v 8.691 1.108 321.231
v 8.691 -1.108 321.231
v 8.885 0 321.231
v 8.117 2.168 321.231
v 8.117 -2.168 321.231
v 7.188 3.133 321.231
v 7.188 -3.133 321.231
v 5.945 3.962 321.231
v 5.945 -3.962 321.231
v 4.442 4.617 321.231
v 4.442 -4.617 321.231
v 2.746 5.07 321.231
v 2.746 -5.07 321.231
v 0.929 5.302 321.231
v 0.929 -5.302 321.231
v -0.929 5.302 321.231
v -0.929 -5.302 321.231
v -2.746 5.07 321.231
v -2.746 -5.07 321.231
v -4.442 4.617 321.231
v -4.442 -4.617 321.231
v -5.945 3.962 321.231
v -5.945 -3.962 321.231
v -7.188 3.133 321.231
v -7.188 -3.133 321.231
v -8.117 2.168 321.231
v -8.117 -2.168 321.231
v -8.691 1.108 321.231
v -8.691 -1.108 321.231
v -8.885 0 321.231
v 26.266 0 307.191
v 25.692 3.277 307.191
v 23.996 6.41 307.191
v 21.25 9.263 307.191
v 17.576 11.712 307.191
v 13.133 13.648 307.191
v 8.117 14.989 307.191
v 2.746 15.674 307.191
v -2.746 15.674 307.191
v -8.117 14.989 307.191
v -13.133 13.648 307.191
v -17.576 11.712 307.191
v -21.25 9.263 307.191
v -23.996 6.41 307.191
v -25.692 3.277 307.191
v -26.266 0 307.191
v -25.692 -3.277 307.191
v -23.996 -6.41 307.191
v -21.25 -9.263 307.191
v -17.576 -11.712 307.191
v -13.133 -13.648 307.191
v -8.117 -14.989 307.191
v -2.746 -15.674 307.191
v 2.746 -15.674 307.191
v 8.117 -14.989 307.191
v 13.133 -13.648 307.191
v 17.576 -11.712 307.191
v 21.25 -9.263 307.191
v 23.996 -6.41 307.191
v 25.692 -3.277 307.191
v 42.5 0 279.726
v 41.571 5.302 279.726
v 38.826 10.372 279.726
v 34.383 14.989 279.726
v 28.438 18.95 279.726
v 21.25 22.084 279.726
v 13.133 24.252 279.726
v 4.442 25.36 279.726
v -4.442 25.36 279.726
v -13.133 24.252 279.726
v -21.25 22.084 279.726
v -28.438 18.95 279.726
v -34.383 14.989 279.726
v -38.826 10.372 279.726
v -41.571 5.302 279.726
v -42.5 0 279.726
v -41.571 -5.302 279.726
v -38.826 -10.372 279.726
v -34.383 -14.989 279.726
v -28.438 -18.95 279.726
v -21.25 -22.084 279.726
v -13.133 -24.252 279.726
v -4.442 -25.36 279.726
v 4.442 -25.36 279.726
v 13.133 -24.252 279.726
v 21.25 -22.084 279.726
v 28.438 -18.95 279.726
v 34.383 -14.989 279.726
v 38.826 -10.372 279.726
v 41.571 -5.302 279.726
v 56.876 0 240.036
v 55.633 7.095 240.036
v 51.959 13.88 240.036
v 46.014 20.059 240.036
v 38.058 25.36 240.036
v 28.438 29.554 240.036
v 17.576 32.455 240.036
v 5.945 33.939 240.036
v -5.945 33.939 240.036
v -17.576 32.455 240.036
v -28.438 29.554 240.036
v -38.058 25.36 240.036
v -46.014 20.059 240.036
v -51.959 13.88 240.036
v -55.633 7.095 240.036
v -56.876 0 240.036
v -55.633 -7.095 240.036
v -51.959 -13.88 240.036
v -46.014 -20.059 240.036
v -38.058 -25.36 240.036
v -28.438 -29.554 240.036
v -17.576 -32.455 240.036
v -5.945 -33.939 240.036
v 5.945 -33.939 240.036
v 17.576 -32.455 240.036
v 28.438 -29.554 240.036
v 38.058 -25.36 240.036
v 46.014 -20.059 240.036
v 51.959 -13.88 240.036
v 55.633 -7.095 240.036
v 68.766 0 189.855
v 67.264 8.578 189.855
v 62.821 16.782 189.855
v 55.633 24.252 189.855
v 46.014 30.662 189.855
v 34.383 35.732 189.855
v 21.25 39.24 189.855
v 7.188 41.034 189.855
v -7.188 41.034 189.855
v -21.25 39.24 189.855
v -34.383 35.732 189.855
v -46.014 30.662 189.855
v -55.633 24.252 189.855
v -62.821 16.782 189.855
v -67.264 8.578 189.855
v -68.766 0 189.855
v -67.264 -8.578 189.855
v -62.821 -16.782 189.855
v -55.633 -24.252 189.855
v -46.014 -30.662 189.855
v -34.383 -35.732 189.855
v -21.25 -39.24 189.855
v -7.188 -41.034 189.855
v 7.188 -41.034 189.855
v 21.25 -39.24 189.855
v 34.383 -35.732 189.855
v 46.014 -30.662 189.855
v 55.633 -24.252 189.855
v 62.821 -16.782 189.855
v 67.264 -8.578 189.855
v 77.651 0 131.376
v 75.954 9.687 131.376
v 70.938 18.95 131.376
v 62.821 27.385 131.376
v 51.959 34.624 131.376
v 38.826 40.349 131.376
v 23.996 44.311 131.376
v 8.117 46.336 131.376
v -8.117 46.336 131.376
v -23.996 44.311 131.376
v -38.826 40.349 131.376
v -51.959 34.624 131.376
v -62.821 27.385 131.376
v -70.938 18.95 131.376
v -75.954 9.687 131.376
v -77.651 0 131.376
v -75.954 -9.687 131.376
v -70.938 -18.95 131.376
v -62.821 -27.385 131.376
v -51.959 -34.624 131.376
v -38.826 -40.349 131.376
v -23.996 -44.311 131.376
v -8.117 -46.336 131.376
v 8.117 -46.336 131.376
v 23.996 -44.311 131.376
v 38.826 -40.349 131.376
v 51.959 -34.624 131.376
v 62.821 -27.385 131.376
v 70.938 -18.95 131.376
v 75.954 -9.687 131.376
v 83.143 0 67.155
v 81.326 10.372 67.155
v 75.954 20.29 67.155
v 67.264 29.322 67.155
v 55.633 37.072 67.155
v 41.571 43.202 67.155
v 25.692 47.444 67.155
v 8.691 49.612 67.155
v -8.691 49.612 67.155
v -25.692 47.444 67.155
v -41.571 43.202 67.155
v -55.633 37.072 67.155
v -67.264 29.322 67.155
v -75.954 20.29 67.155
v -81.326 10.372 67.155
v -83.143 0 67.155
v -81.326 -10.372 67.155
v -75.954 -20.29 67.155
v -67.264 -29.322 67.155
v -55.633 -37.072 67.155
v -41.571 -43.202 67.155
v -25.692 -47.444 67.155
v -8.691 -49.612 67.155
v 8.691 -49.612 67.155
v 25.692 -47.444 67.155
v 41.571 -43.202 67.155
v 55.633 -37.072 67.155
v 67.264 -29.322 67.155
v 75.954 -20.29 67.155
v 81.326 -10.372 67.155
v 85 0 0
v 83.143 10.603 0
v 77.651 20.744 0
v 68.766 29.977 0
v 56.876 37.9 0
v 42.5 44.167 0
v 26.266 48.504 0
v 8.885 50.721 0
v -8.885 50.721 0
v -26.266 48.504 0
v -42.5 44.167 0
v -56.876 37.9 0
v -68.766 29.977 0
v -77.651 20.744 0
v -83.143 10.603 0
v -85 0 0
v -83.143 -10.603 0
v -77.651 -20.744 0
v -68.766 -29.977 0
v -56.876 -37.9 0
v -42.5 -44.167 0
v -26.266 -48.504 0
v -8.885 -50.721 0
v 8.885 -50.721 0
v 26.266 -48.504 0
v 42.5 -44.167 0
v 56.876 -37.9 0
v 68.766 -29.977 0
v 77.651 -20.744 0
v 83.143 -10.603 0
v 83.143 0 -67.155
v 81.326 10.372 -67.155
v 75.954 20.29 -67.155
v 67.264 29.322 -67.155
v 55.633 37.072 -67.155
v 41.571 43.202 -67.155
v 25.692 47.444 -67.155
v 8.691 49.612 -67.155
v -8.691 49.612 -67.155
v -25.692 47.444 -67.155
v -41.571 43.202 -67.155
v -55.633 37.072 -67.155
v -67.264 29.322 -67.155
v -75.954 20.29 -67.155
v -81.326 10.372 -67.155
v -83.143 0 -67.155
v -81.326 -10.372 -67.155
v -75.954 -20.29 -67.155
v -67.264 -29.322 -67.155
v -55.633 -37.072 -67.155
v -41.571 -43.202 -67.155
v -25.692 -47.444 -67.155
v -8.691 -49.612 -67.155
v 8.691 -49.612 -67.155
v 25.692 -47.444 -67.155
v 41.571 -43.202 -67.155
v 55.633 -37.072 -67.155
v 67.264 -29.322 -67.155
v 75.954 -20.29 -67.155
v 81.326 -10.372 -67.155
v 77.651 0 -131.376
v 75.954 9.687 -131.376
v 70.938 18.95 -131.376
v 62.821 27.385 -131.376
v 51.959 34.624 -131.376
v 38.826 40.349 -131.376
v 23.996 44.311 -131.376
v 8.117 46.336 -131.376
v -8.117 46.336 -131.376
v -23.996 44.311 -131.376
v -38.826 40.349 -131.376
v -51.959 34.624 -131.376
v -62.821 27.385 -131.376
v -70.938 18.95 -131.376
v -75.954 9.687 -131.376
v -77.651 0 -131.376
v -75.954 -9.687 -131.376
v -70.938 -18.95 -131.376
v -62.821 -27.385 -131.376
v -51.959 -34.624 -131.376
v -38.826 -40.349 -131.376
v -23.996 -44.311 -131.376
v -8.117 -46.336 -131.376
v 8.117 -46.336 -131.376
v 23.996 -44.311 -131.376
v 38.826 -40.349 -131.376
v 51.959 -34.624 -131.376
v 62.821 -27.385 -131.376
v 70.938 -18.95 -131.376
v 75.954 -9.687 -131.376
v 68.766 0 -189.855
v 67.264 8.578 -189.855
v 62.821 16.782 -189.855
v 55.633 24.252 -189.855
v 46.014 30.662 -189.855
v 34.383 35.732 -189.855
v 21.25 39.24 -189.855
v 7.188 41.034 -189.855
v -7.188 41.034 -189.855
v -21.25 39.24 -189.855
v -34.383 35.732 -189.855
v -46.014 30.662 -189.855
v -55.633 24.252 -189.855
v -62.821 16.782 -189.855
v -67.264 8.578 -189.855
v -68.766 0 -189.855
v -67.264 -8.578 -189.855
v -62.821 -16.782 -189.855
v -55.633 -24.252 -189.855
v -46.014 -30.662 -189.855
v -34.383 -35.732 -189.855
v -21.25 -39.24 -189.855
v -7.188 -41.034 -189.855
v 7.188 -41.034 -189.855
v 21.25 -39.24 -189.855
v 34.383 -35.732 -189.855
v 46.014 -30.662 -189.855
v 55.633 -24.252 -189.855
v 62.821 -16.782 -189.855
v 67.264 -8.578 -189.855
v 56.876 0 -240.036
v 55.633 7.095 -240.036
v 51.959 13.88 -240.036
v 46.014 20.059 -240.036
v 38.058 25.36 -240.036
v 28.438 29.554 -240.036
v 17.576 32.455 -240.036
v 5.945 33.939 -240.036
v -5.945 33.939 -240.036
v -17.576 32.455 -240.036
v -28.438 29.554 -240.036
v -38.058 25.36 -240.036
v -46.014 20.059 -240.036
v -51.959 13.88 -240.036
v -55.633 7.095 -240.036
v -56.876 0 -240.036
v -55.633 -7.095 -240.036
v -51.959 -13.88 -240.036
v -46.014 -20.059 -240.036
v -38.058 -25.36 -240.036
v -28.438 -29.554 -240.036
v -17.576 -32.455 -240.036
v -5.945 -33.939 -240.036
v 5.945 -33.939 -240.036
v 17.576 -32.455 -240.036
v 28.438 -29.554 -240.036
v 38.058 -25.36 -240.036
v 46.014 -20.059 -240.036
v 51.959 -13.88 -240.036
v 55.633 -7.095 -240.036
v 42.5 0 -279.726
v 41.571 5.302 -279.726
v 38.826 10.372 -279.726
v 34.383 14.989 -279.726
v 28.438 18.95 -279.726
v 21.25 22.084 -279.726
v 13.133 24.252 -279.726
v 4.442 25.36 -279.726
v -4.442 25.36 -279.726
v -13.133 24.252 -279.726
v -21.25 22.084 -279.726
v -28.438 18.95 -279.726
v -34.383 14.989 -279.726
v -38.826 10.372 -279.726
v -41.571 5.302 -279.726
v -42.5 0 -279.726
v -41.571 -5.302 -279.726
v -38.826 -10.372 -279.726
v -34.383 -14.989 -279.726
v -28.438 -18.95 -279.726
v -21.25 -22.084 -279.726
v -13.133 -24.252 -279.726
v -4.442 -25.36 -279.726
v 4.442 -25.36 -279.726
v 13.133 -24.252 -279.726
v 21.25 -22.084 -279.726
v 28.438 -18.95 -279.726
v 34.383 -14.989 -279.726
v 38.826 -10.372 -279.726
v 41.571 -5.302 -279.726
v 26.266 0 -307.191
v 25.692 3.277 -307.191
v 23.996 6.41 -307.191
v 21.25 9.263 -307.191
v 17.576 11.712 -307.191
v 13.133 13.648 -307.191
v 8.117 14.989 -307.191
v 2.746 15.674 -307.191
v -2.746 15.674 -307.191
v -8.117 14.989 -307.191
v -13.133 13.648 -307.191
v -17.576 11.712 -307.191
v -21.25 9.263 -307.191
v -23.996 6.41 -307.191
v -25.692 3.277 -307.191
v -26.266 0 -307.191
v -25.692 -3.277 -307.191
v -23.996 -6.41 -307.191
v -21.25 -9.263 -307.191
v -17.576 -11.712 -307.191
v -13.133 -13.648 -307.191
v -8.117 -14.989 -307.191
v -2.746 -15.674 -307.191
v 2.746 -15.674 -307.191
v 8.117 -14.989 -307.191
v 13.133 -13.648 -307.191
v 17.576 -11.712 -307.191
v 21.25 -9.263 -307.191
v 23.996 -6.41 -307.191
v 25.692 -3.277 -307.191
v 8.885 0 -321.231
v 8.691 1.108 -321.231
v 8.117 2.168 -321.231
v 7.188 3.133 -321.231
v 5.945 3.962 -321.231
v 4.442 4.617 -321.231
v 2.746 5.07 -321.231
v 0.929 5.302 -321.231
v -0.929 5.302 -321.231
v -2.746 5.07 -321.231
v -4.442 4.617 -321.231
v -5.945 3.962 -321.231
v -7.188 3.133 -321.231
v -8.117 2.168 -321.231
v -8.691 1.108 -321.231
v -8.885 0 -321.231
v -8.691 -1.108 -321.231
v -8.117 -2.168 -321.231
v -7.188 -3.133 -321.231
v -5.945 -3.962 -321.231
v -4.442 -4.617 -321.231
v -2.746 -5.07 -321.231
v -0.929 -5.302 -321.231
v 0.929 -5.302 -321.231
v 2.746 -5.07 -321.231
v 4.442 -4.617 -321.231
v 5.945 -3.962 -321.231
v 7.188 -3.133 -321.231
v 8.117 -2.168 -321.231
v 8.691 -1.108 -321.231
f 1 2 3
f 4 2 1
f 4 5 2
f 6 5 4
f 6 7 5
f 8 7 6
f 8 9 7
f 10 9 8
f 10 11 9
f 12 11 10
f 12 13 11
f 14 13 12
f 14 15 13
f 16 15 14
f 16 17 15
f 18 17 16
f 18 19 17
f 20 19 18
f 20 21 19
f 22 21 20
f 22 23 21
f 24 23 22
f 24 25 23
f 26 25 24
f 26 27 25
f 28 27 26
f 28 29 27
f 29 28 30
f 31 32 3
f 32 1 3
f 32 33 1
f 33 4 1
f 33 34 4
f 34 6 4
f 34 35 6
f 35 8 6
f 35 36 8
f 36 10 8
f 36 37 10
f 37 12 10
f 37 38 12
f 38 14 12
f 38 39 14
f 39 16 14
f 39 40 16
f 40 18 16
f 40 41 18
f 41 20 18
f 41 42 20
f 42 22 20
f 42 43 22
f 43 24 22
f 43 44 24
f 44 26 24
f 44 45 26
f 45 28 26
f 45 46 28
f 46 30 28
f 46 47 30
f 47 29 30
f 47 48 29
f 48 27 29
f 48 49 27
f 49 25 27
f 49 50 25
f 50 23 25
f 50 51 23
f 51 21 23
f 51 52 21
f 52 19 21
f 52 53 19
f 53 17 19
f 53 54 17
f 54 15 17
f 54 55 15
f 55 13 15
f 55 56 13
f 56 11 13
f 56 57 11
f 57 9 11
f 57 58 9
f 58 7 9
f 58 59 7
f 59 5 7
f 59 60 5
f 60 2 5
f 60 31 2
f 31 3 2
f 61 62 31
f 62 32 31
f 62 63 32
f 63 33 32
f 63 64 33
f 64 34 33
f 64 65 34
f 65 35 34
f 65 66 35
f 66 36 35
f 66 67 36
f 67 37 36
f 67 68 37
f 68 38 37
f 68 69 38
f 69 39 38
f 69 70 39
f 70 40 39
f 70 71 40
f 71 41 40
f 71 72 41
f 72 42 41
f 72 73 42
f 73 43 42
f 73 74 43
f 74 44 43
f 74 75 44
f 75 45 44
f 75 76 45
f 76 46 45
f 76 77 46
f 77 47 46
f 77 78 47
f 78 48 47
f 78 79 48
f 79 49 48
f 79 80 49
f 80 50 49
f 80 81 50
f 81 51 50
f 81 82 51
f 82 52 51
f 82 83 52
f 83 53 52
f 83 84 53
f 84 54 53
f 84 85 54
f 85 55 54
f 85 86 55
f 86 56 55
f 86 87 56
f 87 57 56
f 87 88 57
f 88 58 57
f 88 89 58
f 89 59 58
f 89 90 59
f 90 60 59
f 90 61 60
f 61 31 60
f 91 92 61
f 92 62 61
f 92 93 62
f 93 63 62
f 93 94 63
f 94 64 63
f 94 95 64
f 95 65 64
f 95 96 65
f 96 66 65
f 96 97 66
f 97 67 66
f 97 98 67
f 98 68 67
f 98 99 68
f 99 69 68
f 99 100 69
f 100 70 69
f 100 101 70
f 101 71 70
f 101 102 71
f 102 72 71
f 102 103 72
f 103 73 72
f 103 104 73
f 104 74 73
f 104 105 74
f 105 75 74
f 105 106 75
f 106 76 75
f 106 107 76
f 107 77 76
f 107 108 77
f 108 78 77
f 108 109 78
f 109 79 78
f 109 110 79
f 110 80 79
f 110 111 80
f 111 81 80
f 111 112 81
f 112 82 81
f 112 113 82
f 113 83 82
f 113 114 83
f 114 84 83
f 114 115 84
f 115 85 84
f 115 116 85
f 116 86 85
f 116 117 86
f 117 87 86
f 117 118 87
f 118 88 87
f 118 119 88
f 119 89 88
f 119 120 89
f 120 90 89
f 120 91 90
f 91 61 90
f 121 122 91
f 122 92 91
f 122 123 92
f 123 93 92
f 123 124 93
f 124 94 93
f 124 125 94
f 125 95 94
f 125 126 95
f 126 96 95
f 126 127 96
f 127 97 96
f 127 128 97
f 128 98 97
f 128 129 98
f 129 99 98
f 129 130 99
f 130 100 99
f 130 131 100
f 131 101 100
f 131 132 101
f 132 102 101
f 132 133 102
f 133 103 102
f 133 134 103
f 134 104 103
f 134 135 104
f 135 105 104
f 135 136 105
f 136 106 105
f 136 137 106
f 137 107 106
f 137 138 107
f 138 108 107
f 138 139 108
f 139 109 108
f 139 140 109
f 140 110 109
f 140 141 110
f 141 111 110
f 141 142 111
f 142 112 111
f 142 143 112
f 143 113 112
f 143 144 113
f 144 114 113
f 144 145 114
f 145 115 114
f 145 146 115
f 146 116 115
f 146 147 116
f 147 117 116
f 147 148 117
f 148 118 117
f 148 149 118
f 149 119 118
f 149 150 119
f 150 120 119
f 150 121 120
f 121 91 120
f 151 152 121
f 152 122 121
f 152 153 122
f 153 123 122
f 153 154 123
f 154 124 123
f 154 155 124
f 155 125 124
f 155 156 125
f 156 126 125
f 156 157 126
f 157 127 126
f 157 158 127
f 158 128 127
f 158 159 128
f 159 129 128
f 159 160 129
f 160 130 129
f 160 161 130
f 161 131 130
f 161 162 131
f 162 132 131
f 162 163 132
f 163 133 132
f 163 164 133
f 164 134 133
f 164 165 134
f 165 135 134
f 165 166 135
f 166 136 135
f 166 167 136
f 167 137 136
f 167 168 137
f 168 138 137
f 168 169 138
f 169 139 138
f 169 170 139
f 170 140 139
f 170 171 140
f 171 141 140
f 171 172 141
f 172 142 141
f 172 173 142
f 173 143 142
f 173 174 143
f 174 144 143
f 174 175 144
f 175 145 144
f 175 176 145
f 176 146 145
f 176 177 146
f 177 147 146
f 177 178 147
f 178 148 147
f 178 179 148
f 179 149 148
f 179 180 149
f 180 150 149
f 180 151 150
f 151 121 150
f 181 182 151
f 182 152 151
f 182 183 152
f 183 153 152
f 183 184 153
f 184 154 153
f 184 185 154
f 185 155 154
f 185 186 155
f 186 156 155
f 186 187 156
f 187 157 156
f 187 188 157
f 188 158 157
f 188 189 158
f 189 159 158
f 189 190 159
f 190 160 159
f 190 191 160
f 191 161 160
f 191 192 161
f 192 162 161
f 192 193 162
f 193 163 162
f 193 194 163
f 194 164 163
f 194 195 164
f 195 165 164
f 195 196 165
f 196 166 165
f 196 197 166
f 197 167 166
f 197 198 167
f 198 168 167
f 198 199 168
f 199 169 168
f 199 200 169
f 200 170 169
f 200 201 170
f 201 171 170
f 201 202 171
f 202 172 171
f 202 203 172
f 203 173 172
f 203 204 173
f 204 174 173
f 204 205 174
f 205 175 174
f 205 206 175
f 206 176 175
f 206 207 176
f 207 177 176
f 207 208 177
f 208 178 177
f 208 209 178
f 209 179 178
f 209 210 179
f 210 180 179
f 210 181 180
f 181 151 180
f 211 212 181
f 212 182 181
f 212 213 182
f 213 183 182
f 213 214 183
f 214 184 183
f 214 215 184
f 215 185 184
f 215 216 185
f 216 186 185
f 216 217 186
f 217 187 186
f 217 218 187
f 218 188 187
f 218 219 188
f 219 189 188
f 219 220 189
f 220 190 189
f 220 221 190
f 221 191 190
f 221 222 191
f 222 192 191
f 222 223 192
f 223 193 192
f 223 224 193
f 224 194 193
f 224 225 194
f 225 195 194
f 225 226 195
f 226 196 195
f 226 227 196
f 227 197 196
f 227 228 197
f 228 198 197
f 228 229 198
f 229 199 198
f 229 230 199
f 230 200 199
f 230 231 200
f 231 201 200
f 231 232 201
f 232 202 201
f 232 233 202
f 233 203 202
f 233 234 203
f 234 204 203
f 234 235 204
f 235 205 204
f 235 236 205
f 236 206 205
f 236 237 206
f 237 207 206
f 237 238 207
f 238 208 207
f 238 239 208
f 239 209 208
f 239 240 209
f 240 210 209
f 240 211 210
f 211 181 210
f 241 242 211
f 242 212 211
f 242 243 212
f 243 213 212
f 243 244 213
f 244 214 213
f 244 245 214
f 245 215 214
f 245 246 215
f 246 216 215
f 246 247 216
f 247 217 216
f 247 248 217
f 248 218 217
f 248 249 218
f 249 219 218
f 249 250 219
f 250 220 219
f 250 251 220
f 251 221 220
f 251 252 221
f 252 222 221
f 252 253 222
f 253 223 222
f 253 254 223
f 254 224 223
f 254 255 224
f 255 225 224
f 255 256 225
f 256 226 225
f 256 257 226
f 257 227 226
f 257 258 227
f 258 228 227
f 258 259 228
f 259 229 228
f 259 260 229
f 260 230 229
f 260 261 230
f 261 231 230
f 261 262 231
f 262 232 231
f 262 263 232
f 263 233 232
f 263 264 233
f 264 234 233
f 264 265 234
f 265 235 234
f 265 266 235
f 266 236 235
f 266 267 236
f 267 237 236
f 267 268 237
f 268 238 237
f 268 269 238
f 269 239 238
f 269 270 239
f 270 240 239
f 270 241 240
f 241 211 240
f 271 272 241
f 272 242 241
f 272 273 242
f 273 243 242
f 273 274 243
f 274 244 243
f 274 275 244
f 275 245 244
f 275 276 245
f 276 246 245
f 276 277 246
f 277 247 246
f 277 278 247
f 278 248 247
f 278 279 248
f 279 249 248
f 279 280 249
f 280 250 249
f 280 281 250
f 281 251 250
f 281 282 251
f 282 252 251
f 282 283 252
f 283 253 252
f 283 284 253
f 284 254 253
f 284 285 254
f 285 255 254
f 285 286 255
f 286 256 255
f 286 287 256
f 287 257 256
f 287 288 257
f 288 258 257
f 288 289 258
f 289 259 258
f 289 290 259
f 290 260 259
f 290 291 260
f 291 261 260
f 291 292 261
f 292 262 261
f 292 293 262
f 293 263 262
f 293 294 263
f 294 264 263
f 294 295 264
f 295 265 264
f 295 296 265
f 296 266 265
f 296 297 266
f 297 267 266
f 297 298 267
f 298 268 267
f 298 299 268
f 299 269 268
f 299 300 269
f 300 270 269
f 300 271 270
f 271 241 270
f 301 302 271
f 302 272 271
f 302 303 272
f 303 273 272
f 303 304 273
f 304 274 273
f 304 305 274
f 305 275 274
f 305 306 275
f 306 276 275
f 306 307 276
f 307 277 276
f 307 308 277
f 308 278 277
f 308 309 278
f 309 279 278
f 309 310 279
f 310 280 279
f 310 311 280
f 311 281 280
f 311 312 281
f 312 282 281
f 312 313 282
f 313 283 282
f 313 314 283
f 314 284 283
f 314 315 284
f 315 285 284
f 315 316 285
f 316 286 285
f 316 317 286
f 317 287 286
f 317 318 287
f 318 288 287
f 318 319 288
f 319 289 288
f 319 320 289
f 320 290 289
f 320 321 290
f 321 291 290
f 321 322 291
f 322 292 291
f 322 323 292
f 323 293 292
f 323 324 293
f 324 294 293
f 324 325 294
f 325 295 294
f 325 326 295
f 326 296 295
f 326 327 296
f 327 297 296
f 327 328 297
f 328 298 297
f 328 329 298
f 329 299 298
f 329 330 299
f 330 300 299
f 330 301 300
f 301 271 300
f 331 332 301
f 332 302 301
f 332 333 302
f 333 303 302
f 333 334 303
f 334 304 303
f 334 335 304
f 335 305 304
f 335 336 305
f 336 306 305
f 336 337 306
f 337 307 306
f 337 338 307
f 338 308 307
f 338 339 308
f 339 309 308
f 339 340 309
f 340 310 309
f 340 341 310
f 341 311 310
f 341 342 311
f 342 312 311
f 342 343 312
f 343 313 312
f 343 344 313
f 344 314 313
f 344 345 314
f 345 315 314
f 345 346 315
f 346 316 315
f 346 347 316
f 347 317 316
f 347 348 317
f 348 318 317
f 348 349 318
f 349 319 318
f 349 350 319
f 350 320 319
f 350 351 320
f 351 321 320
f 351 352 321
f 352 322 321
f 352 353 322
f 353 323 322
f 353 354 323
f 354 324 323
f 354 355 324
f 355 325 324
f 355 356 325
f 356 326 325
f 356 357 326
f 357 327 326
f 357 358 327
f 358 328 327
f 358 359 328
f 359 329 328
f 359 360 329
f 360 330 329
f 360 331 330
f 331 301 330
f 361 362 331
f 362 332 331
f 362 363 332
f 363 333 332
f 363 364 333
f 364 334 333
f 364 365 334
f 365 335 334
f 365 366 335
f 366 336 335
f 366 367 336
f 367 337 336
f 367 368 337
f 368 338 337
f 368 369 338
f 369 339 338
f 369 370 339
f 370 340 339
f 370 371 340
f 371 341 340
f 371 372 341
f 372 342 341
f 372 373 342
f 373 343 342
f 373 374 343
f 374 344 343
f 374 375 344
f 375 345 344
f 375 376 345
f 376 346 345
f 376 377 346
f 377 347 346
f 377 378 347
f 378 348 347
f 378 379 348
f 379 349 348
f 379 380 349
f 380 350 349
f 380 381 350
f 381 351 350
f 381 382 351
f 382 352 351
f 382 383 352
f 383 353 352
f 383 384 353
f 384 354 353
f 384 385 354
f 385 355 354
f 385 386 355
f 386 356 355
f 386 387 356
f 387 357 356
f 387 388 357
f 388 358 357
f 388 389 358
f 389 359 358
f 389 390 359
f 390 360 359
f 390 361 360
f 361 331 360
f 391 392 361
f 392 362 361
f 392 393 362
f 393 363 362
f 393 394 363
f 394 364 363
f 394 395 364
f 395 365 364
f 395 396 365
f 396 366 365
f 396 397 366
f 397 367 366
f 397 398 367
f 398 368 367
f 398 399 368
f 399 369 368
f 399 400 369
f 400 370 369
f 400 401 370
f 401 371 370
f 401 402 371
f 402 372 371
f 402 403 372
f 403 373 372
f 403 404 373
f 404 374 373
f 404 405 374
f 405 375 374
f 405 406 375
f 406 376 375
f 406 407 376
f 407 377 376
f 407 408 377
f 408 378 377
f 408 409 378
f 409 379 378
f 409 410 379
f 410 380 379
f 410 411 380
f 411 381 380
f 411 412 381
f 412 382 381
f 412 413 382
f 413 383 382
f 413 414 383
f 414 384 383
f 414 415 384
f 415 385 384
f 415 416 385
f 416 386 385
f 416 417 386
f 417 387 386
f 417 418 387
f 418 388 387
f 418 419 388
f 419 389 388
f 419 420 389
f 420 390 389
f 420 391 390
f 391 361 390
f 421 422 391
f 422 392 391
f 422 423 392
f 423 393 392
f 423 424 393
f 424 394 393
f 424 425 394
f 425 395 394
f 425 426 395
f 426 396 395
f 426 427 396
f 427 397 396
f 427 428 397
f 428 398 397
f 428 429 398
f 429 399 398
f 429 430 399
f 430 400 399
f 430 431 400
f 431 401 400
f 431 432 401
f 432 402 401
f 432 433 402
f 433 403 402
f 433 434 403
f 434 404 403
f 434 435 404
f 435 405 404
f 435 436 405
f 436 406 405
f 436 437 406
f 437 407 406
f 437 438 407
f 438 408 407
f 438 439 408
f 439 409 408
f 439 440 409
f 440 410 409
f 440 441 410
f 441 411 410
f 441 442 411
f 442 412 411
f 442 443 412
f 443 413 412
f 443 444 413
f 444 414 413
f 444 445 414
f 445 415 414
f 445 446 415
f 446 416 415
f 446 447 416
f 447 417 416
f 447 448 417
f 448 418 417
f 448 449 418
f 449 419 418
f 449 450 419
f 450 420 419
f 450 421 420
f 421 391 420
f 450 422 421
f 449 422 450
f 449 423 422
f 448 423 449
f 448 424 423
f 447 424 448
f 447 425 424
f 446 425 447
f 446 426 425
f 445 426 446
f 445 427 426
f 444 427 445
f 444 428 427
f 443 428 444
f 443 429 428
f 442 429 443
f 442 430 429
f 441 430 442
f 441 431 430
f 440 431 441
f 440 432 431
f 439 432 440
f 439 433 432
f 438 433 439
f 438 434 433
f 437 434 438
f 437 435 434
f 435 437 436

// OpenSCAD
// Generated by SolidPython 1.0.1 on 2020-07-29 00:46:46


scale(v = [5, 3, 19]) {
	sphere(r = 17);
}
/***********************************************
*********      SolidPython code:      **********
************************************************
 
# import packages: SolidPython
from solid import *
from solid.utils import *
from itertools import chain, combinations, permutations


class Resize:

    def __init__(self, scad_file):
        self.scad_file = scad_file
        #self.scad_file = import_scad(scad_file)
        # cone/cylinder param:
        self.r1 = 0
        self.r2 = 0
        self.h = 0
        # rectangular prism param:
        self.w = 0
        self.l = 0
        # ellipse param:
        self.r = 0

    # import OpenScad code (file name corresponds to shape)


    # classify shape + parameters
    def assign(self, param1, param2, param3):
        if self.scad_file == 'cone.scad':
            self.r1 = param1
            self.r2 = param2
            self.h = param3
        elif self.scad_file == 'cylinder.scad':
            self.r1 = param1
            self.r2 = param2
            self.h = param3
        elif self.scad_file == 'rectangularPrism.scad':
            self.h = param1
            self.l = param2
            self.w = param3
        else:
            self.r = param1
            self.h = param2

    # resize parameters
    def iterate(self):
        x = range(3, 20, 2)
        i = 1
        if self.scad_file == 'cone.scad':
            tempList = list(permutations(x, 2))
            for temp in tempList:
                param1 = temp[0]
                param2 = temp[1]
                filepath = 'produced_scad_files/' + 'cone' + str(param1) + '_' + str(param2) + '_' + '.scad'
                scad_render_to_file(cylinder(h=param1, r1=param2, r2=0), filepath)

        elif self.scad_file == 'cylinder.scad':
            tempList = list(permutations(x, 3))
            for temp in tempList:
                param1 = temp[0]
                param2 = temp[1]
                filepath = 'produced_scad_files/' + 'cylinder' + str(param1) + '_' + str(param2) + '_' + '.scad'
                scad_render_to_file(cylinder(h=param1, r1=param2, r2=param2), filepath)

        elif self.scad_file == 'rectangularPrism.scad':
            tempList = list(permutations(x, 3))
            for temp in tempList:
                param1 = temp[0]
                param2 = temp[1]
                param3 = temp[2]
                filepath = 'produced_scad_files/' + 'rectangularPrism' + str(param1) + '_' + str(param2) + '_' + str(
                    param3) + '.scad'
                scad_render_to_file(cube(size=(param1, param2, param3)), filepath)

        elif self.scad_file == 'ellipse.scad':
            tempList = list(permutations(x, 4))
            for temp in tempList:
                param1 = temp[0]
                param2 = temp[1]
                param3 = temp[2]
                param4 = temp[3]
                filepath = 'produced_scad_files/' + 'ellipse' + str(param1) + '_' + str(param2) + '_' + str(param3) + '_' + str(param4) + '.scad'
                scad_render_to_file(scale([param1, param2, param3])(sphere(r=param4)), filepath)

    def render_to_scadfile(self):
        scad_render_to_file(scad, 'example.scad') 
 
************************************************/
